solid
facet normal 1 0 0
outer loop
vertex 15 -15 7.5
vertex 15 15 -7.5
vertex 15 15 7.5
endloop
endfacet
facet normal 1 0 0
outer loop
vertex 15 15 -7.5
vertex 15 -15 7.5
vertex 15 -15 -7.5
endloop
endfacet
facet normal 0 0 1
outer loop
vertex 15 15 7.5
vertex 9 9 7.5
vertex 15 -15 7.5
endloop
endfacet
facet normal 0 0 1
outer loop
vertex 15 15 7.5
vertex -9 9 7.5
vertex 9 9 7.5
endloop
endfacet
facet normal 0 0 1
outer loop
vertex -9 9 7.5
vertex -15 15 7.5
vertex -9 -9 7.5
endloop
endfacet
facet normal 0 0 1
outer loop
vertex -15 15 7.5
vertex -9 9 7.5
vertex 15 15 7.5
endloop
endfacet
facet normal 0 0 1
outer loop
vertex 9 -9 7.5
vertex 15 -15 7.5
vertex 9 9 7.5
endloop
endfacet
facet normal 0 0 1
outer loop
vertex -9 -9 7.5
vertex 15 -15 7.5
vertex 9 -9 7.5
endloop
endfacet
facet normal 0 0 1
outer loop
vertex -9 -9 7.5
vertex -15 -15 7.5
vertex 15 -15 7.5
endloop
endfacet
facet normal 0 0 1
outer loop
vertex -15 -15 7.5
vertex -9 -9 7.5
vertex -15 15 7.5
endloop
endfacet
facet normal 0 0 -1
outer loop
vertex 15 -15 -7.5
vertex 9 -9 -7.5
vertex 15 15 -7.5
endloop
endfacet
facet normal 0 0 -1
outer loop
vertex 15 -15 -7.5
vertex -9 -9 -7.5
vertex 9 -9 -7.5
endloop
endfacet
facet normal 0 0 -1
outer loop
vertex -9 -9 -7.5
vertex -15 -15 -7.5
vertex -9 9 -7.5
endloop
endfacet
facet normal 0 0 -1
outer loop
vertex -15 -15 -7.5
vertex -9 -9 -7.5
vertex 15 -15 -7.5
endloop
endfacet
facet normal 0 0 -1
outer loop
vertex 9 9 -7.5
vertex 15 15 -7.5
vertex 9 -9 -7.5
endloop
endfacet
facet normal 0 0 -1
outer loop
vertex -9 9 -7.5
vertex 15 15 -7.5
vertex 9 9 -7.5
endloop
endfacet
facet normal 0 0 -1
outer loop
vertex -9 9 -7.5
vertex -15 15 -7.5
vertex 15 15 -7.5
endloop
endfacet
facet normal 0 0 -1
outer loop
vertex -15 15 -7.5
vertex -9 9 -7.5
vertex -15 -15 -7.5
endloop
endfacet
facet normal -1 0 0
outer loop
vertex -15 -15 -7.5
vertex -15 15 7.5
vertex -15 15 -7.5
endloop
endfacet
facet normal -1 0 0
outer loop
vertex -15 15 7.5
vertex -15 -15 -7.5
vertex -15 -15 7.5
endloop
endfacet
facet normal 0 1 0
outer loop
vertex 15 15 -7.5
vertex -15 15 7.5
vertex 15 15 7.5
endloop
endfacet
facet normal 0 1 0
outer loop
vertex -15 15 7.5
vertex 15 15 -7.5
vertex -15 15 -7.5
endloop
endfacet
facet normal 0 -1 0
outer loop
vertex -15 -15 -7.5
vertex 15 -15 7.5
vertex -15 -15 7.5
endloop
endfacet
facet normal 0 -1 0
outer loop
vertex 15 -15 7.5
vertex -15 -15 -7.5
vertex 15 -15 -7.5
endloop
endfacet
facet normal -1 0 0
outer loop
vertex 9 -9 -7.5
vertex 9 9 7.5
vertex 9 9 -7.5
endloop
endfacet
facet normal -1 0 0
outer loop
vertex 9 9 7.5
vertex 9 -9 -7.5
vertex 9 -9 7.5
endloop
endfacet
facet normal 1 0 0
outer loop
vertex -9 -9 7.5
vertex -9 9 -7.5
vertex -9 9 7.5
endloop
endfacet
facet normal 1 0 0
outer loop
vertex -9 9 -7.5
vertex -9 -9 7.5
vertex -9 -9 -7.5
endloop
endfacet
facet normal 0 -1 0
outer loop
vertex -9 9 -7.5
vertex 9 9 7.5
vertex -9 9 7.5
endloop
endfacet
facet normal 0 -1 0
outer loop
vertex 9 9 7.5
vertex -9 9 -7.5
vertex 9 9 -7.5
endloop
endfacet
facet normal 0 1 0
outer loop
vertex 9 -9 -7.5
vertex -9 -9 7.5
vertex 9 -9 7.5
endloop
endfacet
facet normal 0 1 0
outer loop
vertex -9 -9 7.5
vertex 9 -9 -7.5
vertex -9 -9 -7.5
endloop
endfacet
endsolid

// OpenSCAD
/*
  calibration-cube.scad

  A simple printability reference object.
  Intended as a quick calibration and dimensional check for a 3D printer.
*/

$fn = 48;

cube_size = 30;
cutout_size = 18;
height = 15;
wall = 2.5;

module calibration_cube() {
    difference() {
        cube([cube_size, cube_size, height], center = true);
        translate([0, 0, 0])
            cube([cutout_size, cutout_size, height + 1], center = true);
    }
}

calibration_cube();
